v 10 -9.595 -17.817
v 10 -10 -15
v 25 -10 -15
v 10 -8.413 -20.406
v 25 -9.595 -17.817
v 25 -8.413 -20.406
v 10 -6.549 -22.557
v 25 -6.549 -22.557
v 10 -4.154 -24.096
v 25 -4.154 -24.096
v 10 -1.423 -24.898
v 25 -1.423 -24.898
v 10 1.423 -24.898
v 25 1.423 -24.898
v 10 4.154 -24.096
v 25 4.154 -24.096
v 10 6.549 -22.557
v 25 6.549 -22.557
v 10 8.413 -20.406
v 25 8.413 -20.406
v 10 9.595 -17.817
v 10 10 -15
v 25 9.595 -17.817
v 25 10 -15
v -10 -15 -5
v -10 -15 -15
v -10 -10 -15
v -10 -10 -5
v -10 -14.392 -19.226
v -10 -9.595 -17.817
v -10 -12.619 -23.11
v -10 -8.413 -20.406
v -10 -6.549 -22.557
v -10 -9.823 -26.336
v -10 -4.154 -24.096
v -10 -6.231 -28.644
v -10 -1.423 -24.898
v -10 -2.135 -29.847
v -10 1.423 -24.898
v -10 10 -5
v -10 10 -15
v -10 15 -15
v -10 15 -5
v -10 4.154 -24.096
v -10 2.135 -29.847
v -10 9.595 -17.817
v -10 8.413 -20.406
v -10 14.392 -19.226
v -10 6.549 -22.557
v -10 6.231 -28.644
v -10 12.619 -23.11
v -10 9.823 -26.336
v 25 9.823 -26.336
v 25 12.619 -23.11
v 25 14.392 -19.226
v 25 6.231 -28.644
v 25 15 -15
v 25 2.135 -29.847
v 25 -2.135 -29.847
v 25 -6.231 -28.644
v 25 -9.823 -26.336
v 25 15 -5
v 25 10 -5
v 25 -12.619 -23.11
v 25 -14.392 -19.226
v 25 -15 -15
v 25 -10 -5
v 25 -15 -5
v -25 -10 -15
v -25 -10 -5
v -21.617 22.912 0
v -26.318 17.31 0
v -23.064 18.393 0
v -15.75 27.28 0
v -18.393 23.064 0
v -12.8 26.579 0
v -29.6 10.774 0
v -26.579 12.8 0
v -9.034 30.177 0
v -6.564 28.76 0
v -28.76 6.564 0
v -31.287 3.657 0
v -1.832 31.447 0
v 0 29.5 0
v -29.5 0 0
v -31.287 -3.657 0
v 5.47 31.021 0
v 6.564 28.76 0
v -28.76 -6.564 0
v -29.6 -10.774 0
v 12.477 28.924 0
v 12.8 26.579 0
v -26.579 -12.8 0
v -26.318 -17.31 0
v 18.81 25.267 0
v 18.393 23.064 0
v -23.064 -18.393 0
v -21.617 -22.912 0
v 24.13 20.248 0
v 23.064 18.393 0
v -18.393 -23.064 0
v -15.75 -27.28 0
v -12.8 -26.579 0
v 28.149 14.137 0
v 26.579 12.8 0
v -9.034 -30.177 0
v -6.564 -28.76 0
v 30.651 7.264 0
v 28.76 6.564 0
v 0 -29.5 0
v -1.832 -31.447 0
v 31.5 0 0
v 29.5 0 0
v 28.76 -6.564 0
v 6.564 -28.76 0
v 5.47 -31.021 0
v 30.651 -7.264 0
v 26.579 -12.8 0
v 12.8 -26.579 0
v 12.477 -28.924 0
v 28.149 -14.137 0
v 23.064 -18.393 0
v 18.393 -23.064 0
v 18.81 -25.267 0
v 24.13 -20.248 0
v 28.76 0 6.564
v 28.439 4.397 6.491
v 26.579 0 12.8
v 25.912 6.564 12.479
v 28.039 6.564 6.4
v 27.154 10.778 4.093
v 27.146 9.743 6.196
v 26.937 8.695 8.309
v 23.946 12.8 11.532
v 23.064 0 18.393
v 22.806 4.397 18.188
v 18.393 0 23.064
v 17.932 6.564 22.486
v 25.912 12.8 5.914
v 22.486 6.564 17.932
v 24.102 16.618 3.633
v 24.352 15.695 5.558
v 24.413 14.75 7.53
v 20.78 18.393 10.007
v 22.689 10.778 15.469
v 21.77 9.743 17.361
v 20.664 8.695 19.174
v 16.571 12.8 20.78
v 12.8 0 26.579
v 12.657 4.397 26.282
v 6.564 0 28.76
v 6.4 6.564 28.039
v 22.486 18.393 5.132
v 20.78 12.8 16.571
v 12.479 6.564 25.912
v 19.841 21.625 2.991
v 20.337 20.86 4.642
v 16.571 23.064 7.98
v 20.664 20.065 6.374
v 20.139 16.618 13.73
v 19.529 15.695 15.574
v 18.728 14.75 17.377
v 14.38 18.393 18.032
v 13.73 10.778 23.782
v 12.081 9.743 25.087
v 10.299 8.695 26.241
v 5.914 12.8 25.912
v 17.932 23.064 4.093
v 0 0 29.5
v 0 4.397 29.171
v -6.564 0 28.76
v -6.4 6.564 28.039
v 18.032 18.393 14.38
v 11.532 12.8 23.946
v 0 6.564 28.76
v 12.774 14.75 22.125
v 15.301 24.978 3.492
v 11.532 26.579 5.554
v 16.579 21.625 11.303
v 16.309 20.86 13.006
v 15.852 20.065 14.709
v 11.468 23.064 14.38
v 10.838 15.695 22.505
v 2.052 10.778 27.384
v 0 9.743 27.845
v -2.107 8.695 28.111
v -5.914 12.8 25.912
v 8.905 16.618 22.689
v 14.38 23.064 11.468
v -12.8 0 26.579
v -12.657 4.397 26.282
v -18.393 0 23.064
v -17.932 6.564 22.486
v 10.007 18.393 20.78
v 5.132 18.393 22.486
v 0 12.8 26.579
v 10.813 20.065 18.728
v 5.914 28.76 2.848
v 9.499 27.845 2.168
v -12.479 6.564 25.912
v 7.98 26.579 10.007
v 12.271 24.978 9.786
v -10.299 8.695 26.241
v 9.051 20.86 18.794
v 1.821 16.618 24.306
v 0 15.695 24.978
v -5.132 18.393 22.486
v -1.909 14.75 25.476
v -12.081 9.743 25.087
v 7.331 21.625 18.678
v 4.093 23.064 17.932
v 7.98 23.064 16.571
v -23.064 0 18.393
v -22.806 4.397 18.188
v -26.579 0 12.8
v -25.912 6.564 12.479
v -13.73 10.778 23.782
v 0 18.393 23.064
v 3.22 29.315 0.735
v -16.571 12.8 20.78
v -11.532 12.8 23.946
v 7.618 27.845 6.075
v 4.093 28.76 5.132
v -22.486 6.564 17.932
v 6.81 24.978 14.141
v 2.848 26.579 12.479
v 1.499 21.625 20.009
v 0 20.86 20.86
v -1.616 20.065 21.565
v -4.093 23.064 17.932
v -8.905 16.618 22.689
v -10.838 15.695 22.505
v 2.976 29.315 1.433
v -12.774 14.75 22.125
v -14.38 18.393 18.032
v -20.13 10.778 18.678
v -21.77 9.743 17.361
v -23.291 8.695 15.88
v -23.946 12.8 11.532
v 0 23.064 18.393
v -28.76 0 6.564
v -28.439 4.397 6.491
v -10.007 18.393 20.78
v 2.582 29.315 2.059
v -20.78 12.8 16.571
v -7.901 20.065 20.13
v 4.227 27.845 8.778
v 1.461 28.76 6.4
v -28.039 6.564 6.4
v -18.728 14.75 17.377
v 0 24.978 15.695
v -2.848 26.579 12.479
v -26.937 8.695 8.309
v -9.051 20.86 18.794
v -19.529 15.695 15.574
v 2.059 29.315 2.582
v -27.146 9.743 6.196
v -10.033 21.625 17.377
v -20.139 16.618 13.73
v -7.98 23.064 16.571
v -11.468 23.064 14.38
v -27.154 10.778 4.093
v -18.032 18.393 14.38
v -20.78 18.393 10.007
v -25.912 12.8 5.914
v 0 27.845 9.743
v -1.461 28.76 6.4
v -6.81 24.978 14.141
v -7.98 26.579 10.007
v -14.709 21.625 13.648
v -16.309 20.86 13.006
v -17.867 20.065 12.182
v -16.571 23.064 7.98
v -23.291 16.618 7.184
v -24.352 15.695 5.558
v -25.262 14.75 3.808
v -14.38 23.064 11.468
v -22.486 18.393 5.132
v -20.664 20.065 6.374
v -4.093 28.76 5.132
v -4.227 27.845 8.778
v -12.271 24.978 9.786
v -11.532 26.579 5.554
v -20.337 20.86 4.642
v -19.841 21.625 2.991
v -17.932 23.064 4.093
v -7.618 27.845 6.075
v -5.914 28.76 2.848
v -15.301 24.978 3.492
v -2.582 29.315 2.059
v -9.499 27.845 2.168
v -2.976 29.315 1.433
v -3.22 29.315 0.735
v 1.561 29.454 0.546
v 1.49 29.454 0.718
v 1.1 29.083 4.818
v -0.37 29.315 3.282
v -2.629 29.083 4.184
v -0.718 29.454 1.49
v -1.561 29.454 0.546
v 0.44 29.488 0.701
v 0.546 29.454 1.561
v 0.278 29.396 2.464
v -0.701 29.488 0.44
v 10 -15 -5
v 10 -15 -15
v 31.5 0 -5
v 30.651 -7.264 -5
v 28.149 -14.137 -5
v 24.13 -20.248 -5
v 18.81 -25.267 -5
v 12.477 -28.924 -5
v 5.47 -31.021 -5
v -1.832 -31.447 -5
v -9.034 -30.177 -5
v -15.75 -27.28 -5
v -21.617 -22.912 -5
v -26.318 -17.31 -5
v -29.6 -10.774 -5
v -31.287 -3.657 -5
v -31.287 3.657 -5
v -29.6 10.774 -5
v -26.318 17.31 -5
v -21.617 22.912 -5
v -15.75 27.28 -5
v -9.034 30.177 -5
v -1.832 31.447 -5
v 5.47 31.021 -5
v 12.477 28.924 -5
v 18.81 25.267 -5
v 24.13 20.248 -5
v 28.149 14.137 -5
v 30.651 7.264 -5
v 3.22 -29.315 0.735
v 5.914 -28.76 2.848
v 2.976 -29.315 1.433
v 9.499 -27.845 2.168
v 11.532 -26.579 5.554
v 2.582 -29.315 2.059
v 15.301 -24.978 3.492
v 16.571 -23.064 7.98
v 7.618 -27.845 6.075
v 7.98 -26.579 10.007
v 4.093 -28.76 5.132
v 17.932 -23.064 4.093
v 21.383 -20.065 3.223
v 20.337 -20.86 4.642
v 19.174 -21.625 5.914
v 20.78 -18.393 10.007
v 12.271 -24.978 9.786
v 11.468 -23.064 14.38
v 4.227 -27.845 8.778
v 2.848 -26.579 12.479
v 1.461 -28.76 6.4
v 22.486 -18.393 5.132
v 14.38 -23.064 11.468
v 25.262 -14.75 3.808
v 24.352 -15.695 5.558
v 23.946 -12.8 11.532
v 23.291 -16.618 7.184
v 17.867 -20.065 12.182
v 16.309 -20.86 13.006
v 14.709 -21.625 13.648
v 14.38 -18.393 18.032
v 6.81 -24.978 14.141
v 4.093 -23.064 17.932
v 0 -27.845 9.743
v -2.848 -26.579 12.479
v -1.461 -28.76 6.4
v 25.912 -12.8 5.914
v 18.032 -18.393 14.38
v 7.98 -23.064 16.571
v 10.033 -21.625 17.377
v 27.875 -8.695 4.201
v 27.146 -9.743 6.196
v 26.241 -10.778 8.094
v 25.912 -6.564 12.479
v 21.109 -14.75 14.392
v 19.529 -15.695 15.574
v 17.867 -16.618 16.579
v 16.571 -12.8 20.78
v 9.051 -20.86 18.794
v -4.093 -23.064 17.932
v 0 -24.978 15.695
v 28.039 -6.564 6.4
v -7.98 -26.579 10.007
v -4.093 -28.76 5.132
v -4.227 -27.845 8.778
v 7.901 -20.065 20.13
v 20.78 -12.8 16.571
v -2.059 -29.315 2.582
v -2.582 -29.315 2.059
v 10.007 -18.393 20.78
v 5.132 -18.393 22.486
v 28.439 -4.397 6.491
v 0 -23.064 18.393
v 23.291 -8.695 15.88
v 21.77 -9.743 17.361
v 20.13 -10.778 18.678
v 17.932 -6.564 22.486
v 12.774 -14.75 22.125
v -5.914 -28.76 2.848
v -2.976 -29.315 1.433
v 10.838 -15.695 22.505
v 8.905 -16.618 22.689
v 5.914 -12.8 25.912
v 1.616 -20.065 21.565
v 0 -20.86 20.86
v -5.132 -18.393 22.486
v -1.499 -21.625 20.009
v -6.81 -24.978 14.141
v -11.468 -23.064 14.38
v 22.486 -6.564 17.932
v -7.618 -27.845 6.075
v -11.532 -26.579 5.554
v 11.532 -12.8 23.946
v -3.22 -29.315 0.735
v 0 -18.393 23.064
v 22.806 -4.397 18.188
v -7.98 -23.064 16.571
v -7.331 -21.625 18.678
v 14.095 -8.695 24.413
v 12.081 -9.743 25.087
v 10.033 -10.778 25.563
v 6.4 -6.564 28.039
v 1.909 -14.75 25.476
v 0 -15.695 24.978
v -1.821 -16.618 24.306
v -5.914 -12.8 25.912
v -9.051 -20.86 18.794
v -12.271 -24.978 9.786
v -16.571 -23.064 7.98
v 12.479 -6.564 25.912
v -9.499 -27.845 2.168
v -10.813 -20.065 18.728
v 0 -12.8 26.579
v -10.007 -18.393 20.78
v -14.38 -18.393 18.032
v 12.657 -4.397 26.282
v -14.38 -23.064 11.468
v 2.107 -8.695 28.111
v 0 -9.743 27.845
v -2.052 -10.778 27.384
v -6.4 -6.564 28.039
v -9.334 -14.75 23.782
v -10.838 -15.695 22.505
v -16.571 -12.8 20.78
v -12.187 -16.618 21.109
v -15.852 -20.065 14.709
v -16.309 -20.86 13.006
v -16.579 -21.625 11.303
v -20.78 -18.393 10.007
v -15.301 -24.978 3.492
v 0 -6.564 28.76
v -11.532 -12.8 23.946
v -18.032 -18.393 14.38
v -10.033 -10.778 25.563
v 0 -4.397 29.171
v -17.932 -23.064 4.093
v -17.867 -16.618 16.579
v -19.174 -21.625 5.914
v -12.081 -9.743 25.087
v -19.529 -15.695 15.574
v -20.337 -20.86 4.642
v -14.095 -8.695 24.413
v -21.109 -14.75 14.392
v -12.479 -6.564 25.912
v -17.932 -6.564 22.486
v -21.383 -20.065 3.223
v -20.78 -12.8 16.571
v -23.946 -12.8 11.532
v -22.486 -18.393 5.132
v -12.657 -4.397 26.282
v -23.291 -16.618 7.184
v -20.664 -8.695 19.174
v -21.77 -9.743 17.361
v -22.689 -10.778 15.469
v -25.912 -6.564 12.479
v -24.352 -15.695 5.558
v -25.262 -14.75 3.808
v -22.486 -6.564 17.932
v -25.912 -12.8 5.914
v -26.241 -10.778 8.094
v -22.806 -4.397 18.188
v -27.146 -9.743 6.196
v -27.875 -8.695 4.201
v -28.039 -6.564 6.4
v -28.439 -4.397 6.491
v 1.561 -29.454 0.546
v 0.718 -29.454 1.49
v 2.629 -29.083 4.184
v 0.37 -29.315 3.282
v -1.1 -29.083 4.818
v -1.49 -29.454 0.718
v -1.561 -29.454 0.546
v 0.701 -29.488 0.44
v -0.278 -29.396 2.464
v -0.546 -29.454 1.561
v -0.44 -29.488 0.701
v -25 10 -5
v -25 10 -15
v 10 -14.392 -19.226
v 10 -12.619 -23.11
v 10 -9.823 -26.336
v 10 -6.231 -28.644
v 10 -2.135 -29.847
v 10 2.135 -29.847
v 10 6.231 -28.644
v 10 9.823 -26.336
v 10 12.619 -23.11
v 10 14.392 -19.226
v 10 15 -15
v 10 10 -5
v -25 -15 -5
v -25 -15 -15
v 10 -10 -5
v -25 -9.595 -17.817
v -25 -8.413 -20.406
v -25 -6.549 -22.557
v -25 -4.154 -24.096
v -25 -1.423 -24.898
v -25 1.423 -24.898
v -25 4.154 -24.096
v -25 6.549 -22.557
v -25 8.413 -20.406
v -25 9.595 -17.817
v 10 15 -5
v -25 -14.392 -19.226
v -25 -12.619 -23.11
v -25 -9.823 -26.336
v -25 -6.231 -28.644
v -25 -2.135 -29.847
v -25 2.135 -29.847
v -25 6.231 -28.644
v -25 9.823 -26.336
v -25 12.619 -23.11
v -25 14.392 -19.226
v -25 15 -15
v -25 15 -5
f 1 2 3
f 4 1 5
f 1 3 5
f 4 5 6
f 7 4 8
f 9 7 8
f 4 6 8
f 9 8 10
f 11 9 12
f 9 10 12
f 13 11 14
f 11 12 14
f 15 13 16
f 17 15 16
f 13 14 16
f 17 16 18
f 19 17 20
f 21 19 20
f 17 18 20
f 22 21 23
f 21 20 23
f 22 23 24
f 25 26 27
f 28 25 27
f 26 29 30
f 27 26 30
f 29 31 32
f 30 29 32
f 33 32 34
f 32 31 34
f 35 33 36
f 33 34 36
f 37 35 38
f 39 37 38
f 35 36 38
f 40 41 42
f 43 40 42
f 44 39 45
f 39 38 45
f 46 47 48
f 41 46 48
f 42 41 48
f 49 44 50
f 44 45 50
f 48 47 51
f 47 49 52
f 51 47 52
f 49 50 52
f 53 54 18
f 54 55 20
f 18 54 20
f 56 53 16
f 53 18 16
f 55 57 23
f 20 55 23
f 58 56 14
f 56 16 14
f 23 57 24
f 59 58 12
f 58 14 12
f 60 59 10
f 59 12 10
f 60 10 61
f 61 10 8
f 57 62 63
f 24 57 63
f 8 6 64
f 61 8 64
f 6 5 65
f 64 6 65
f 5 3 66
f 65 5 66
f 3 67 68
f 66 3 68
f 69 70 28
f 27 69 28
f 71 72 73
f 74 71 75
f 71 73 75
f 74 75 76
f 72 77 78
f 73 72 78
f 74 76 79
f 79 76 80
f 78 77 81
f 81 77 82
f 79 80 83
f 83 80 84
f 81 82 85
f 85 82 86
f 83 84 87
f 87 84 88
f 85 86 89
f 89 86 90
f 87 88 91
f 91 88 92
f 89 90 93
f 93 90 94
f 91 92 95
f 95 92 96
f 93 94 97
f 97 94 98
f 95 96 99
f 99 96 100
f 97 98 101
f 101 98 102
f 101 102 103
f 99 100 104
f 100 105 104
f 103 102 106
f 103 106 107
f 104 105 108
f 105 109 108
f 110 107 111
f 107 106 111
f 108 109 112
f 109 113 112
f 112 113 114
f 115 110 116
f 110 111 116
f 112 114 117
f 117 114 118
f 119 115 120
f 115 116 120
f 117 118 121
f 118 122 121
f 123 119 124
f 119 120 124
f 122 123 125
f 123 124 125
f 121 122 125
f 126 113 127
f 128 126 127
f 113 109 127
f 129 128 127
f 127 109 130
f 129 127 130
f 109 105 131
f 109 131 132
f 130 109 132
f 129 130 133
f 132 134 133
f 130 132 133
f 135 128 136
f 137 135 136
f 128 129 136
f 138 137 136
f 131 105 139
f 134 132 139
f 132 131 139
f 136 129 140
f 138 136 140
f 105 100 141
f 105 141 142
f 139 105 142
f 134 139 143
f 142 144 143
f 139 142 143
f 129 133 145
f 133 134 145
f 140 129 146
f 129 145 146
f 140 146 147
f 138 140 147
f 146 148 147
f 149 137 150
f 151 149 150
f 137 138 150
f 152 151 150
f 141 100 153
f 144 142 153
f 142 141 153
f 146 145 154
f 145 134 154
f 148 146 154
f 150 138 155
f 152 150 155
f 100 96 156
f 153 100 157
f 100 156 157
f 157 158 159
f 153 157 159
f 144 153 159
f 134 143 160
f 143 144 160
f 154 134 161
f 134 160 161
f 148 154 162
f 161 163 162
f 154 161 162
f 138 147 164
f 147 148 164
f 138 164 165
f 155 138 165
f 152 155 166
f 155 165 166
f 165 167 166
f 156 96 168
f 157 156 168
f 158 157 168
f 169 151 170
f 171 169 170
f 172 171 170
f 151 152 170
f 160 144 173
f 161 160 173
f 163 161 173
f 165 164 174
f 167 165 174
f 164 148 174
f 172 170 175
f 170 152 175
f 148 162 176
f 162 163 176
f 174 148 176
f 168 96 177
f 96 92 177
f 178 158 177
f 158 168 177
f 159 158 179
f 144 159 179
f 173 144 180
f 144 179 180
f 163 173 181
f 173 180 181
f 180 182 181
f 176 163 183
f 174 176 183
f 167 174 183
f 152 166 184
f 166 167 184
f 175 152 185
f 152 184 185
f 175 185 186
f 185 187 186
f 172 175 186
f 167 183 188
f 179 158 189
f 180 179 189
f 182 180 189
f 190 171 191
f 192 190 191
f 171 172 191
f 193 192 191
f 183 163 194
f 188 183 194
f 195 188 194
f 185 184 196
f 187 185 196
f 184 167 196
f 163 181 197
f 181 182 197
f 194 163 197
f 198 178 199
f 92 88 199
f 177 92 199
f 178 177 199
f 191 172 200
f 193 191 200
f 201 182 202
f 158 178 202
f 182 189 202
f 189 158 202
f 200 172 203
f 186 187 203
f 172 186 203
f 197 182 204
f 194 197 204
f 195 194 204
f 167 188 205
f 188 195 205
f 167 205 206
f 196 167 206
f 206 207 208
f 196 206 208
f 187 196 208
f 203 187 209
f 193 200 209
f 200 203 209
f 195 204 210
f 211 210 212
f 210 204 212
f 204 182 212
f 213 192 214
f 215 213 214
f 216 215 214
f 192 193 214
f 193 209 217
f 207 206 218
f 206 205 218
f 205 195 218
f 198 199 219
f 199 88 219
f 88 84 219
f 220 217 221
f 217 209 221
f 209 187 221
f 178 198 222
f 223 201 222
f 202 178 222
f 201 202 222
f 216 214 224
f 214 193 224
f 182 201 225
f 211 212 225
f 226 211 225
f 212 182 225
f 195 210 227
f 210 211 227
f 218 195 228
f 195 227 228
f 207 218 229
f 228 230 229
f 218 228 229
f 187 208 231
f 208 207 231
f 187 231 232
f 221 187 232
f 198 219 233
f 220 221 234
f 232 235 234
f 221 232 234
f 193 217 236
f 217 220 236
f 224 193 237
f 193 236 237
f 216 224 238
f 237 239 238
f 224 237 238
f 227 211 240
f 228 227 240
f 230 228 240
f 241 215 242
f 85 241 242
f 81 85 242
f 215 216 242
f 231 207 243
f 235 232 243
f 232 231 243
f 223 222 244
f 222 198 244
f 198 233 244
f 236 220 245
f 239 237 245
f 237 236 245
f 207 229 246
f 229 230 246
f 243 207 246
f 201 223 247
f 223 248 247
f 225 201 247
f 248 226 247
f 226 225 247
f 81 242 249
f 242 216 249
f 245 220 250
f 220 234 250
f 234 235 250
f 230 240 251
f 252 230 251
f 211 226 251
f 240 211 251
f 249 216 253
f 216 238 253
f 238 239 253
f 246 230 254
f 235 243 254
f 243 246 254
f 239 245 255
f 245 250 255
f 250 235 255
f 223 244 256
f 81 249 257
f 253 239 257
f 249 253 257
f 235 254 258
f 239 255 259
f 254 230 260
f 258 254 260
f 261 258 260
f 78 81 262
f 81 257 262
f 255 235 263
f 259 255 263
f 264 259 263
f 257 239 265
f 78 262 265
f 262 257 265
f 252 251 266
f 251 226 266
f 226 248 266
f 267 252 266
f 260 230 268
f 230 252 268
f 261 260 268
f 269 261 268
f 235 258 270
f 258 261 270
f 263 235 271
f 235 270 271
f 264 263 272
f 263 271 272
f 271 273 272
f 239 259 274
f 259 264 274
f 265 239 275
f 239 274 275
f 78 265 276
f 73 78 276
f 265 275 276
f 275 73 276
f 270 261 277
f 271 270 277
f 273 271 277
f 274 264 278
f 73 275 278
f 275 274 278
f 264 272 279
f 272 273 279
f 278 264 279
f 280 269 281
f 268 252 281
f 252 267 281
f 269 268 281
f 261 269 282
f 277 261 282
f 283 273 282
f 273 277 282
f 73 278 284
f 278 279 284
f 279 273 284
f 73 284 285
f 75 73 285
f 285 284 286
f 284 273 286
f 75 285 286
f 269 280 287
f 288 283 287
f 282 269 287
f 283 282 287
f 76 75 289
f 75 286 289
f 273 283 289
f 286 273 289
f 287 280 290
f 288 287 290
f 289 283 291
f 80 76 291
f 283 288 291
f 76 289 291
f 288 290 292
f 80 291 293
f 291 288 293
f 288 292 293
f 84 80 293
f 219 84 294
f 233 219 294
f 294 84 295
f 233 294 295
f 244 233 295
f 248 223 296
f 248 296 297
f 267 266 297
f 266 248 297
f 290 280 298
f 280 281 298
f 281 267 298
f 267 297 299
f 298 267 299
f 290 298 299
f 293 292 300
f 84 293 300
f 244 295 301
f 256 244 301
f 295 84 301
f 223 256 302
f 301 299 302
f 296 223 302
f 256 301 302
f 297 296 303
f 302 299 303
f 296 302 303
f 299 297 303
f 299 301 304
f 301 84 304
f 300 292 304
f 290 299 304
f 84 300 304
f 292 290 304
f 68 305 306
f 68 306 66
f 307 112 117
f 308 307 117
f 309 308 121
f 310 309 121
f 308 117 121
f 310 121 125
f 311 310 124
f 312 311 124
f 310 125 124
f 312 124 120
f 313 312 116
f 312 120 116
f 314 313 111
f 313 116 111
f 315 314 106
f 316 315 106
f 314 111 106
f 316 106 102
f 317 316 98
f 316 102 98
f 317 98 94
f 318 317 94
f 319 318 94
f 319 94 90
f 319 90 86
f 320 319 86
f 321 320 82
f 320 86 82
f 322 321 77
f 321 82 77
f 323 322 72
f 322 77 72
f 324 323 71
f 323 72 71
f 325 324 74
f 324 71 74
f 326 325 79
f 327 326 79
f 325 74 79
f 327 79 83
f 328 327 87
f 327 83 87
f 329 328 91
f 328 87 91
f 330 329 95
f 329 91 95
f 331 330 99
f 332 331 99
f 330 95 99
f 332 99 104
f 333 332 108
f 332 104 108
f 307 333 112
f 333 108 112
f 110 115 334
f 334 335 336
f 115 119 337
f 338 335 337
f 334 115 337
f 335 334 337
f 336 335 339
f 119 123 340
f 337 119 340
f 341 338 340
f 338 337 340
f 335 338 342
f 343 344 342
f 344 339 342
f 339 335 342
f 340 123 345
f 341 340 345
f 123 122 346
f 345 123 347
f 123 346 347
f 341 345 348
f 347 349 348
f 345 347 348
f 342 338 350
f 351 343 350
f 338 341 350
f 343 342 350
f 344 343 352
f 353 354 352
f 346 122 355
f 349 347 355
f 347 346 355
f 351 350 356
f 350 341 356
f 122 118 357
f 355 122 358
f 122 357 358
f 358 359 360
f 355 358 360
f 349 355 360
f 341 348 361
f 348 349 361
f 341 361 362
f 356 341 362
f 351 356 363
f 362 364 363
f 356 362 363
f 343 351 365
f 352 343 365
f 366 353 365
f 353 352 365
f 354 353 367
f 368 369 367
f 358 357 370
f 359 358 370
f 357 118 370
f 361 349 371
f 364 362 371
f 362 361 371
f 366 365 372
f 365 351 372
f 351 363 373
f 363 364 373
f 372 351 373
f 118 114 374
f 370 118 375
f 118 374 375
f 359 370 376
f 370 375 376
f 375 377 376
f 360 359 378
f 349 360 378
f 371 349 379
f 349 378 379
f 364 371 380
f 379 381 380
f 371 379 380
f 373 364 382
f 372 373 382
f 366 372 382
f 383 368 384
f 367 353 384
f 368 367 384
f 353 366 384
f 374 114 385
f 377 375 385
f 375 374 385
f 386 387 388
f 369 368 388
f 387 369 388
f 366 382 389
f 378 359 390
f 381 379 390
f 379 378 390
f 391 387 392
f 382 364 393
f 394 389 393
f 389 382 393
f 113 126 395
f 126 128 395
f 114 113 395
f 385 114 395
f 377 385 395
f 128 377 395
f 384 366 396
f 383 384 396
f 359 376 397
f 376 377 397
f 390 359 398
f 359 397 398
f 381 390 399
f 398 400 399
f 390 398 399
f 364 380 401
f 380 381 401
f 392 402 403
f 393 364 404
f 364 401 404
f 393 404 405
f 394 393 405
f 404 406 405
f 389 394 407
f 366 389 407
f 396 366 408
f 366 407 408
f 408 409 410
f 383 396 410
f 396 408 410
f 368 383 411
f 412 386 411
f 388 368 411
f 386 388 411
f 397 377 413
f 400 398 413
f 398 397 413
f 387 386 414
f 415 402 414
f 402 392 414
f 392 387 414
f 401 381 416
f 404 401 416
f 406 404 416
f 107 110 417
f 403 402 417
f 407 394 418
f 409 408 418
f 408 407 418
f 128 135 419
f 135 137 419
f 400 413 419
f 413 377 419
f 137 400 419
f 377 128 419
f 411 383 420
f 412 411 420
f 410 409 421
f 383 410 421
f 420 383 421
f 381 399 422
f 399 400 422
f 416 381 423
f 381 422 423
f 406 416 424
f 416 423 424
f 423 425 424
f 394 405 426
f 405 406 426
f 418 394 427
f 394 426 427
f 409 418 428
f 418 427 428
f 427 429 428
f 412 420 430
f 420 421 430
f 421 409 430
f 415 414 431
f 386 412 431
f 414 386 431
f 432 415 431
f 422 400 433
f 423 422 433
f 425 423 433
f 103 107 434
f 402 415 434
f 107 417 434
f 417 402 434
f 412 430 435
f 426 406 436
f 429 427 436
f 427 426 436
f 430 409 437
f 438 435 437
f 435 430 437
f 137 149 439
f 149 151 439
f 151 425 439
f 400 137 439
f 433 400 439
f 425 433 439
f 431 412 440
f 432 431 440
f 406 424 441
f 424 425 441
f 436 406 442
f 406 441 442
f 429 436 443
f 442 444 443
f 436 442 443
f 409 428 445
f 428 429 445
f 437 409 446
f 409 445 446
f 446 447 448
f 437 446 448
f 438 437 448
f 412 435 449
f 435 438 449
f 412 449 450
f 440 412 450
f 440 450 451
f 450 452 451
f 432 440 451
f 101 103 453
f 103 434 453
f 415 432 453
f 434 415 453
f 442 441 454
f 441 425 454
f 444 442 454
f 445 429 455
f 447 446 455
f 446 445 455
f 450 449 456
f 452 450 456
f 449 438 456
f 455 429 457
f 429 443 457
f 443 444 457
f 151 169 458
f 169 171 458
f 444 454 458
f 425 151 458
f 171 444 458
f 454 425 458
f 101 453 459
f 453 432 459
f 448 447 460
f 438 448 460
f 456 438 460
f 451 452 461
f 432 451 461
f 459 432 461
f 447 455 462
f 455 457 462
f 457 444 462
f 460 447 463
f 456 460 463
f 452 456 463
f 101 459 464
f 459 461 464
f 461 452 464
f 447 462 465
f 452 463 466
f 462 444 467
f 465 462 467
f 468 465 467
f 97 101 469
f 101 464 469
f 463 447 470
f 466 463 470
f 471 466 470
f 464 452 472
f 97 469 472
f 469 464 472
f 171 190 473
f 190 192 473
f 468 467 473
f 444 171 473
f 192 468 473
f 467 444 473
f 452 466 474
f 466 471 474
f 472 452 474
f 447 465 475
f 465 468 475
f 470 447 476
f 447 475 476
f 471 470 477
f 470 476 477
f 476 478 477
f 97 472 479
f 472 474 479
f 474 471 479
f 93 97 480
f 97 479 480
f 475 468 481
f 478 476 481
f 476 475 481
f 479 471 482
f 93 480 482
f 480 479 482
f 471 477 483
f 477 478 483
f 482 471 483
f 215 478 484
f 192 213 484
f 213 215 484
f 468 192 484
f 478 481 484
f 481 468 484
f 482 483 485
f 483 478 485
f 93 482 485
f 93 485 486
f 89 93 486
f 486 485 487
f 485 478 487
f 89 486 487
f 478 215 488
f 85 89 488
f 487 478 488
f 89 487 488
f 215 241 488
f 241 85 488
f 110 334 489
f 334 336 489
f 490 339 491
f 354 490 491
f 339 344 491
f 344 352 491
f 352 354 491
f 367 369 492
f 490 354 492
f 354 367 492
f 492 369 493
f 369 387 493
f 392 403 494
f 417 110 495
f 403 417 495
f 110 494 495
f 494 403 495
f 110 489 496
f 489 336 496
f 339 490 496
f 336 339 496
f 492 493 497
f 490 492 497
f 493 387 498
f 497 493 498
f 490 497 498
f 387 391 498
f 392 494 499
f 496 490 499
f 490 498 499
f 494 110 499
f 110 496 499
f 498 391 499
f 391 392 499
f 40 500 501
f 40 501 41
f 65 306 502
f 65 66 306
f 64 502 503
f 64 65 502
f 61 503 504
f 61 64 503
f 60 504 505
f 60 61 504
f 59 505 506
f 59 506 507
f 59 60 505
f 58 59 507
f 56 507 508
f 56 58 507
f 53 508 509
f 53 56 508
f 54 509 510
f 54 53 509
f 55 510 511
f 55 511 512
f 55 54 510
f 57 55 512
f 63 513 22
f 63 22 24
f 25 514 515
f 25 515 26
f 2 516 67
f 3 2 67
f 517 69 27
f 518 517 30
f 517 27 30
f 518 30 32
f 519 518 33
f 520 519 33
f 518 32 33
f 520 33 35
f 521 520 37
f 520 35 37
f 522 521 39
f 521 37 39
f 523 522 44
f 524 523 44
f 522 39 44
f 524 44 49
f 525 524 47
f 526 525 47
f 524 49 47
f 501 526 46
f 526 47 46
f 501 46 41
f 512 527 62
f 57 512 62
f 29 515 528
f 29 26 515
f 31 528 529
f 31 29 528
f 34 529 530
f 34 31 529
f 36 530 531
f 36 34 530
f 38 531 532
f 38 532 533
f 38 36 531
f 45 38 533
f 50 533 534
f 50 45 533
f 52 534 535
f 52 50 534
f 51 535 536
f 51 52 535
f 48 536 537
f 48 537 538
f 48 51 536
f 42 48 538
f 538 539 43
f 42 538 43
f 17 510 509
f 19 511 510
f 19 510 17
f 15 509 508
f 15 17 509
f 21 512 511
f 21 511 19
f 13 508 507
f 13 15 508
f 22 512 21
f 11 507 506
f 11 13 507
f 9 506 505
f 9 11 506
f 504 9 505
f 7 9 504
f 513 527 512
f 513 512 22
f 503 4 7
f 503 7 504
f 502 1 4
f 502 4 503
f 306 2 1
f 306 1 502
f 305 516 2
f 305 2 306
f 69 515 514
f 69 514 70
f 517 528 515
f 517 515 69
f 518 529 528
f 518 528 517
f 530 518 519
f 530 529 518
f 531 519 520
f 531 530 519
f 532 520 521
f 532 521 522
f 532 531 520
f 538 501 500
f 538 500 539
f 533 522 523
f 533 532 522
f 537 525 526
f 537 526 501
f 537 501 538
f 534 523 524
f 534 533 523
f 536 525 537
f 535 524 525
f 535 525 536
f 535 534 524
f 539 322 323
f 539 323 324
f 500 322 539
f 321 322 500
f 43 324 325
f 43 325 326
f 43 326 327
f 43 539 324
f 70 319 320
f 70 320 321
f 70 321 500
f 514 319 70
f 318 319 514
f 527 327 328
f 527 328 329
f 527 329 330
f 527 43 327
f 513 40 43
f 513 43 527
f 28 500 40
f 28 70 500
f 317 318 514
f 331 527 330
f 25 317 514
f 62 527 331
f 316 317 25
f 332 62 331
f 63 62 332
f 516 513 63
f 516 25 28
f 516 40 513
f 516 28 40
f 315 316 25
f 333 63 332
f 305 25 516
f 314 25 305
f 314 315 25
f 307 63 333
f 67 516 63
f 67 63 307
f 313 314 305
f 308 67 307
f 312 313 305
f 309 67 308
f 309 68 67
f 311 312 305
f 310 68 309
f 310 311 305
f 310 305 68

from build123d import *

# Parameters (mm, degrees)
F1_ANGLE  = 180
F2_R      = 31.5
F3_DEPTH  = 5
F4_W      = 15
F4_H      = 5
F5_DEPTH  = 10
F6_W      = 15
F6_H      = 5
F5_FACE_W = 15
F5_FACE_H = 5
F7_ANGLE  = 180


with BuildPart() as f1:
    # F0 (on Top) → F1 (revolve)
    with BuildSketch(Plane.XY):
        with BuildLine():
            ThreePointArc((0, -29.5), (20.85965, -20.85965), (29.5, 0))
            ThreePointArc((29.5, 0), (20.85965, 20.85965), (0, 29.5))
            Line((0, 29.5), (0, -29.5))
        make_face()
    revolve(axis=Axis((0, 0, 0), (0, -1, 0)), revolution_arc=F1_ANGLE)

    # F2 (on face) → F3 (join)
    with BuildSketch(Plane(origin=(0, 0, 0), x_dir=(1, 0, 0), z_dir=(0, 0, -1))):
        Circle(F2_R)
    extrude(amount=F3_DEPTH)

    # F4 (on face) → F5 (join)
    with BuildSketch(Plane(origin=(0, 0, -5), x_dir=(1, 0, 0), z_dir=(0, 0, -1))):
        with Locations((-17.5, 12.5)):
            Rectangle(F4_W, F4_H)
        with Locations((-17.5, -12.5)):
            Rectangle(F4_W, F4_H)
        with Locations((17.5, 12.5)):
            Rectangle(F4_W, F4_H)
        with Locations((17.5, -12.5)):
            Rectangle(F4_W, F4_H)
    extrude(amount=F5_DEPTH)

    # F6 (on face) + F5_face (on face) → F7 (revolve)
    with BuildSketch(Plane(origin=(0, 0, -15), x_dir=(1, 0, 0), z_dir=(0, 0, -1))):
        with Locations((-17.5, 12.5)):
            Rectangle(F6_W, F6_H)
    with BuildSketch(Plane(origin=(-17.5, -12.5, -15), x_dir=(1, 0, 0), z_dir=(0, 0, -1))):
        with Locations((35, 0)):
            Rectangle(F5_FACE_W, F5_FACE_H)
    revolve(axis=Axis((1.326716, 0, -15), (1, 0, 0)), revolution_arc=F7_ANGLE)


solid = f1.part
